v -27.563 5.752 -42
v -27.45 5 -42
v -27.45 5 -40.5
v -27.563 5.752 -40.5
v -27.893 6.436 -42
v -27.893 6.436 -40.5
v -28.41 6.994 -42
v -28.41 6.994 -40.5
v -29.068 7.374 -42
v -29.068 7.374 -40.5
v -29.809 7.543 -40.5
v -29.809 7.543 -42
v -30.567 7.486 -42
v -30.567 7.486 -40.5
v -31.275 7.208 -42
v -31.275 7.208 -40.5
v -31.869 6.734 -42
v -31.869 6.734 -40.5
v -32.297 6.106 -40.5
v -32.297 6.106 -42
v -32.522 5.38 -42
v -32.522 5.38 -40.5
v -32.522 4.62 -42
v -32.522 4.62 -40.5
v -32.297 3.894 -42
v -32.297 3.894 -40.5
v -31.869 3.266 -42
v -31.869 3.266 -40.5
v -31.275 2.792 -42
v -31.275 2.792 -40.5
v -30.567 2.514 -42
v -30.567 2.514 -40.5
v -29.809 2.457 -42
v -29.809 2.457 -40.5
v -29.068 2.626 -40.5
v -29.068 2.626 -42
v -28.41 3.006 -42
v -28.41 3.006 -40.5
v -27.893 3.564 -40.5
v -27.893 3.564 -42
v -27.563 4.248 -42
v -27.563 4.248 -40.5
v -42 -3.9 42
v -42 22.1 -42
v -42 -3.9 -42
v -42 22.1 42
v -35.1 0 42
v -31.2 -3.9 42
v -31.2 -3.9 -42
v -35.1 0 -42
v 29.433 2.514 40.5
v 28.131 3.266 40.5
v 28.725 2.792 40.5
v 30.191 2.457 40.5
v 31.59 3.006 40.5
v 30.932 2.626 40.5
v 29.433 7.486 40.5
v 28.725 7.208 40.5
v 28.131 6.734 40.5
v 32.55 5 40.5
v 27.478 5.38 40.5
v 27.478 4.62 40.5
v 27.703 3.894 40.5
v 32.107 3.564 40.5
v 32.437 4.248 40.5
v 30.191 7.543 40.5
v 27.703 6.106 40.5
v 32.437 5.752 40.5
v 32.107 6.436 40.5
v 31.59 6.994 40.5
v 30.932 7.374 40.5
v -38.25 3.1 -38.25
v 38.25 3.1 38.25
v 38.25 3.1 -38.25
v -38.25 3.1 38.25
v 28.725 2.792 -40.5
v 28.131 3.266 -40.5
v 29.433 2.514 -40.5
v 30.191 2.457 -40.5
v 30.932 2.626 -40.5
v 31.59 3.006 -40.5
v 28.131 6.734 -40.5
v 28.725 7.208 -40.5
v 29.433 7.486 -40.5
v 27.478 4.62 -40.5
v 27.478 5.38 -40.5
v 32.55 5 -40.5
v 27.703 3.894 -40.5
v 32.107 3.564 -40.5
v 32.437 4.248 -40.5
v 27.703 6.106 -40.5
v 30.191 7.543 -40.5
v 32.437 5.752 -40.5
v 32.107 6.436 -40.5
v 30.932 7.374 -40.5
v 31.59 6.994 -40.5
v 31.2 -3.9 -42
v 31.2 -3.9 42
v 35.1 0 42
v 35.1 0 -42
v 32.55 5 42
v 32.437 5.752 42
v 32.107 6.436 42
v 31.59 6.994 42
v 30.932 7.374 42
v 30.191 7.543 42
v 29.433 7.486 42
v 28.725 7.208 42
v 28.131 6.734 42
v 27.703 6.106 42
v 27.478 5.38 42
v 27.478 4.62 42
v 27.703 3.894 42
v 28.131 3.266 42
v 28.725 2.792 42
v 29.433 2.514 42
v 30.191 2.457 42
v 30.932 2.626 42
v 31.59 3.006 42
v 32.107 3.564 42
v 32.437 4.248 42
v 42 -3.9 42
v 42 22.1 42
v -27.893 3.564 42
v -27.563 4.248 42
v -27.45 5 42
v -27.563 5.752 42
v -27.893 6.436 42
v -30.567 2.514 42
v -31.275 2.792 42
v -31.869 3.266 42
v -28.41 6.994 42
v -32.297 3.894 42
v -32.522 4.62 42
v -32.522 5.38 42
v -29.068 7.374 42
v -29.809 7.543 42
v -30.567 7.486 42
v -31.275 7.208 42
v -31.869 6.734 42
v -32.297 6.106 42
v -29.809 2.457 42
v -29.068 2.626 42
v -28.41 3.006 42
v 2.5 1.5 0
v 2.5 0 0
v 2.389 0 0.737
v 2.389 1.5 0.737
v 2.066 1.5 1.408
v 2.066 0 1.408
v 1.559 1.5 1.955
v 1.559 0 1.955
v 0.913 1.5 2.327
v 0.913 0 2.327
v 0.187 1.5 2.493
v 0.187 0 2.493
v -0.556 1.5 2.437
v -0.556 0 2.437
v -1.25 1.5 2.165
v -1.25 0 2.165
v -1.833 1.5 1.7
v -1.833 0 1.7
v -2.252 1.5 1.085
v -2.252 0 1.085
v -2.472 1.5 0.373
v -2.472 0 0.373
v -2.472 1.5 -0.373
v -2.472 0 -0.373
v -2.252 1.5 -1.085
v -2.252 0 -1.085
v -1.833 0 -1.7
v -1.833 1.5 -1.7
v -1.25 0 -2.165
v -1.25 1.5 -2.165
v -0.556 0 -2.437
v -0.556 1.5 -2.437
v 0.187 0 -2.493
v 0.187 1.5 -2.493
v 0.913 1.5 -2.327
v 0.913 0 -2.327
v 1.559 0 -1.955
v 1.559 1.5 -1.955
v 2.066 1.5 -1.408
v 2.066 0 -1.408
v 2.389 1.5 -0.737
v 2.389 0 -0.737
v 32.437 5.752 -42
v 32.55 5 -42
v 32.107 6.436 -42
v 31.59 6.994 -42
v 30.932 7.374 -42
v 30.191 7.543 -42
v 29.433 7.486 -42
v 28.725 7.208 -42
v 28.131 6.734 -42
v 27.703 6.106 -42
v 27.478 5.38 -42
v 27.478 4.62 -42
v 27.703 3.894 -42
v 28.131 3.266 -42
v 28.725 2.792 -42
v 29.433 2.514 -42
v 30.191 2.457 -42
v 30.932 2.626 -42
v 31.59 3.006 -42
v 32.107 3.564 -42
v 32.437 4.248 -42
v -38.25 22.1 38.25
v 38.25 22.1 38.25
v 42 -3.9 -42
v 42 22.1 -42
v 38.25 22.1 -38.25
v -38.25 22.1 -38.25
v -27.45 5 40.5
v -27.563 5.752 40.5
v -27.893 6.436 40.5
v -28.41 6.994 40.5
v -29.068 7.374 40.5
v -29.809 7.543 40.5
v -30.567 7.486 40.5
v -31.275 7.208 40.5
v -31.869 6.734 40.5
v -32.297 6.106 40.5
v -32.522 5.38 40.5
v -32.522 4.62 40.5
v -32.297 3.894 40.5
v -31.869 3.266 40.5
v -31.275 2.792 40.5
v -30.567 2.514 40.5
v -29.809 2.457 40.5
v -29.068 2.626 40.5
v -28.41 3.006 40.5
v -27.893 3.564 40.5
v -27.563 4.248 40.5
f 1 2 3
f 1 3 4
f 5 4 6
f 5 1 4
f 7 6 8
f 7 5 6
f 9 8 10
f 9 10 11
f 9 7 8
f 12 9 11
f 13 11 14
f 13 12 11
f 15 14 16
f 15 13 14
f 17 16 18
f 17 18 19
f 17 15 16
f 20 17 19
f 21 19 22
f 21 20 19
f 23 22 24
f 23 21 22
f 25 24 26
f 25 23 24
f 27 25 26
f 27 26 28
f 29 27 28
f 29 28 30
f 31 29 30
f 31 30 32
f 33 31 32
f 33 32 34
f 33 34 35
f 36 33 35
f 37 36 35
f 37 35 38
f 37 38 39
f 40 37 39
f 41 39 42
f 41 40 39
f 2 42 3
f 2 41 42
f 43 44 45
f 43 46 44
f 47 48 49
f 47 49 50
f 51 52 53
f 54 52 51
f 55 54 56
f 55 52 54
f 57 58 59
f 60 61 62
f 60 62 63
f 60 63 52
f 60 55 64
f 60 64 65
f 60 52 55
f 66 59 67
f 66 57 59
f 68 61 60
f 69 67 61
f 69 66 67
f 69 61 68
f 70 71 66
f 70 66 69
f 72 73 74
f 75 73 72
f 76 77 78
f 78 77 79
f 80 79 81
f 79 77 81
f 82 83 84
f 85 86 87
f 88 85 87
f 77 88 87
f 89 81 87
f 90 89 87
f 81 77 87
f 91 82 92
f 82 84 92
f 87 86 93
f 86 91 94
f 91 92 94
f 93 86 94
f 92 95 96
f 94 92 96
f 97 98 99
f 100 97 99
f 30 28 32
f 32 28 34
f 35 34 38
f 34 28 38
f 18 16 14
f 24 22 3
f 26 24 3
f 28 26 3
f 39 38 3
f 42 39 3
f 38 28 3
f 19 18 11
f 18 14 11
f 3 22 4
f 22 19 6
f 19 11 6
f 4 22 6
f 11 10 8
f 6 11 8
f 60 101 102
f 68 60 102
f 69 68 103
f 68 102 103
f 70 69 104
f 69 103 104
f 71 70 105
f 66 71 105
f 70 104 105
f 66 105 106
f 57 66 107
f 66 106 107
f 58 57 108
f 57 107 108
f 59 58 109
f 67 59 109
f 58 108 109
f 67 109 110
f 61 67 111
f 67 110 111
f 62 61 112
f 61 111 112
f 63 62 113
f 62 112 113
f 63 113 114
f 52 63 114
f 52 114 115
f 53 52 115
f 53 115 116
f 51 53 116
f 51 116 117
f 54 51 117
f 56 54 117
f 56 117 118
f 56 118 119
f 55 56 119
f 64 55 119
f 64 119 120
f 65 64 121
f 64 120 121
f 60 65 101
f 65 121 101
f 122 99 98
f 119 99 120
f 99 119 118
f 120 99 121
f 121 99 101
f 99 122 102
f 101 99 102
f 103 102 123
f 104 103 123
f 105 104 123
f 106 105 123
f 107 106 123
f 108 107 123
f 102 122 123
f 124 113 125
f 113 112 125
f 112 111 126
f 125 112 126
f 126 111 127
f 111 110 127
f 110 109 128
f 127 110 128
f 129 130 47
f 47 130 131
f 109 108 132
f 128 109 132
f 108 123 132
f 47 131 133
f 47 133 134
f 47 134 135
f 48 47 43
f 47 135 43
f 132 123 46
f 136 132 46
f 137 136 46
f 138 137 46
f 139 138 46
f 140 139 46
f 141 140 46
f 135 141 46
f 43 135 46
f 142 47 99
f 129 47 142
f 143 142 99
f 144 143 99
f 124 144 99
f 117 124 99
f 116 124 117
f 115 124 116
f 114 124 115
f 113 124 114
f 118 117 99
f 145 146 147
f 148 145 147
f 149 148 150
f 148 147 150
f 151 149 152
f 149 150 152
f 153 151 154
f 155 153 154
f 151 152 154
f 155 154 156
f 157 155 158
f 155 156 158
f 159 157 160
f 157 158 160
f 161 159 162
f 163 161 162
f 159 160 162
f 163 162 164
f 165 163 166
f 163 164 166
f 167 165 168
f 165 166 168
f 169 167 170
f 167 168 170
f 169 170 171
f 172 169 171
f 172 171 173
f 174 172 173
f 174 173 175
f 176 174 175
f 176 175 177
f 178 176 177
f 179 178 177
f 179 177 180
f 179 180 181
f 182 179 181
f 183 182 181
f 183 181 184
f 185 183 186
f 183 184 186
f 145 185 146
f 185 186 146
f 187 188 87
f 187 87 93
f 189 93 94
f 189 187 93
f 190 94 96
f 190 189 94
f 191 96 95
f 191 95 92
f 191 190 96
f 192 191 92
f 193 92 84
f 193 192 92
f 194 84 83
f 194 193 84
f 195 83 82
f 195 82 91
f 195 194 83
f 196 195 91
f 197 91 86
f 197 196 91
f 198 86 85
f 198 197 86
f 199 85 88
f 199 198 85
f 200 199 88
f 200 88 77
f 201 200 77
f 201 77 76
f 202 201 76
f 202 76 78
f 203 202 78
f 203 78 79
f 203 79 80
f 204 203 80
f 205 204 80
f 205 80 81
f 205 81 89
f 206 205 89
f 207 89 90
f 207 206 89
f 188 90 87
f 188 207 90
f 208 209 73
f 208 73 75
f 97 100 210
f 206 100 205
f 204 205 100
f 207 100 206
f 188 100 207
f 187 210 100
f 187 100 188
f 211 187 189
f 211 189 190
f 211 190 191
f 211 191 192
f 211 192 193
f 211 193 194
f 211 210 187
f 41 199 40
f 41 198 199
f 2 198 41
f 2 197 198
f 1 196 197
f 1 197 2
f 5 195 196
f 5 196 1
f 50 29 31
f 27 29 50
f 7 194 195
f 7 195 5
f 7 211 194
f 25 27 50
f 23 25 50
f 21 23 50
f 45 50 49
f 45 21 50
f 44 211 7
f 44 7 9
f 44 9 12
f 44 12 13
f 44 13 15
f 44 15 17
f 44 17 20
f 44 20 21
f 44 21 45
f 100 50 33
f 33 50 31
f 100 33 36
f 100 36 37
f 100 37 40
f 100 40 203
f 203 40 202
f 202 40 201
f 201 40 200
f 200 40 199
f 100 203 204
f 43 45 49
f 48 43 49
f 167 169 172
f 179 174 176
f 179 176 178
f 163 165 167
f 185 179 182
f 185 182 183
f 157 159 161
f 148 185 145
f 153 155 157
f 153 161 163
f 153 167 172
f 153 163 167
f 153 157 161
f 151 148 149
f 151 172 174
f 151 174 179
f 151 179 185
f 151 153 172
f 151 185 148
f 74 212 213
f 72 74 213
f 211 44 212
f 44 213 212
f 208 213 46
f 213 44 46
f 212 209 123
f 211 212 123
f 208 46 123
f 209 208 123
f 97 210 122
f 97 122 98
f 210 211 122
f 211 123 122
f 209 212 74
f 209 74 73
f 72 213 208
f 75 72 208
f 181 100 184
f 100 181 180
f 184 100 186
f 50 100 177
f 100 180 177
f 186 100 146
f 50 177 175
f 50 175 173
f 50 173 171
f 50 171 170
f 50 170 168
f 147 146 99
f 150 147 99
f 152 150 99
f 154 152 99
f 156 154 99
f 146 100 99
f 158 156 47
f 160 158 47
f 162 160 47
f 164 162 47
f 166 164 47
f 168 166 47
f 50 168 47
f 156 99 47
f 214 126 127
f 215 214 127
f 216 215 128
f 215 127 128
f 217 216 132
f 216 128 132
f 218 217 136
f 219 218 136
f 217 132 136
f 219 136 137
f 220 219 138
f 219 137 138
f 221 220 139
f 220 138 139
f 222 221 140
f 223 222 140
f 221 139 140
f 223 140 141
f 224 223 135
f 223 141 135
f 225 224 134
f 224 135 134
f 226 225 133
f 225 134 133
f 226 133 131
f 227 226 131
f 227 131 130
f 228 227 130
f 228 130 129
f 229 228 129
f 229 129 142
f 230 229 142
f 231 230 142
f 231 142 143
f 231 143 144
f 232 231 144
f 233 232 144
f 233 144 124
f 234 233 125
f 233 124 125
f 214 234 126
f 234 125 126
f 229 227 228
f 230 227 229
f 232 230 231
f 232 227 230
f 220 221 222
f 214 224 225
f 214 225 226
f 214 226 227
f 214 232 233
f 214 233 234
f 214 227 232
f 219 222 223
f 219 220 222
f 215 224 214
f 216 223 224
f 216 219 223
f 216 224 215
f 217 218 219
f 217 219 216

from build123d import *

# Parameters (mm, degrees)
PAD_DEPTH       = 42
SKETCH001_R     = 2.5
POCKET_DEPTH    = 1.5
SKETCH002_W     = 76.5
SKETCH002_H     = 76.5
POCKET001_DEPTH = 19
SKETCH003_R     = 2.55
POCKET002_DEPTH = 1.5


with BuildPart() as part:
    # Sketch (on XY_Plane of Origin) → Pad (new body, symmetric)
    with BuildSketch(Plane.XY):
        Polygon((-42, 22.1), (-42, -3.9), (-31.199999, -3.9), (-35.1, 0), (0, 0), (0, 22.1), align=None)
    extrude(amount=PAD_DEPTH, both=True)

    # Mirrored: part across YZ


with BuildPart() as part_1:
    add(part.part)
    add(part.part.mirror(Plane.YZ))

    # Sketch001 (on Face10 of Mirrored) → Pocket (cut)
    with BuildSketch(Plane.XZ):
        Circle(SKETCH001_R)
    extrude(amount=-POCKET_DEPTH, mode=Mode.SUBTRACT)

    # Sketch002 (on Face2 of Pocket) → Pocket001 (cut)
    with BuildSketch(Plane(origin=(0, 22.1, 0), x_dir=(-1, 0, 0), z_dir=(0, 1, 0))):
        Rectangle(SKETCH002_W, SKETCH002_H)
    extrude(amount=-POCKET001_DEPTH, mode=Mode.SUBTRACT)

    # Sketch003 (on Face5 of Pocket001) → Pocket002 (cut)
    with BuildSketch(Plane.XY.offset(42)):
        with Locations((-30, 5)):
            Circle(SKETCH003_R)
        with Locations((30, 5)):
            Circle(SKETCH003_R)
    pocket002 = extrude(amount=-POCKET002_DEPTH, mode=Mode.SUBTRACT)

    # Mirrored001: Pocket002 across XY
    add(pocket002.mirror(Plane.XY), mode=Mode.SUBTRACT)


solid = part_1.part
